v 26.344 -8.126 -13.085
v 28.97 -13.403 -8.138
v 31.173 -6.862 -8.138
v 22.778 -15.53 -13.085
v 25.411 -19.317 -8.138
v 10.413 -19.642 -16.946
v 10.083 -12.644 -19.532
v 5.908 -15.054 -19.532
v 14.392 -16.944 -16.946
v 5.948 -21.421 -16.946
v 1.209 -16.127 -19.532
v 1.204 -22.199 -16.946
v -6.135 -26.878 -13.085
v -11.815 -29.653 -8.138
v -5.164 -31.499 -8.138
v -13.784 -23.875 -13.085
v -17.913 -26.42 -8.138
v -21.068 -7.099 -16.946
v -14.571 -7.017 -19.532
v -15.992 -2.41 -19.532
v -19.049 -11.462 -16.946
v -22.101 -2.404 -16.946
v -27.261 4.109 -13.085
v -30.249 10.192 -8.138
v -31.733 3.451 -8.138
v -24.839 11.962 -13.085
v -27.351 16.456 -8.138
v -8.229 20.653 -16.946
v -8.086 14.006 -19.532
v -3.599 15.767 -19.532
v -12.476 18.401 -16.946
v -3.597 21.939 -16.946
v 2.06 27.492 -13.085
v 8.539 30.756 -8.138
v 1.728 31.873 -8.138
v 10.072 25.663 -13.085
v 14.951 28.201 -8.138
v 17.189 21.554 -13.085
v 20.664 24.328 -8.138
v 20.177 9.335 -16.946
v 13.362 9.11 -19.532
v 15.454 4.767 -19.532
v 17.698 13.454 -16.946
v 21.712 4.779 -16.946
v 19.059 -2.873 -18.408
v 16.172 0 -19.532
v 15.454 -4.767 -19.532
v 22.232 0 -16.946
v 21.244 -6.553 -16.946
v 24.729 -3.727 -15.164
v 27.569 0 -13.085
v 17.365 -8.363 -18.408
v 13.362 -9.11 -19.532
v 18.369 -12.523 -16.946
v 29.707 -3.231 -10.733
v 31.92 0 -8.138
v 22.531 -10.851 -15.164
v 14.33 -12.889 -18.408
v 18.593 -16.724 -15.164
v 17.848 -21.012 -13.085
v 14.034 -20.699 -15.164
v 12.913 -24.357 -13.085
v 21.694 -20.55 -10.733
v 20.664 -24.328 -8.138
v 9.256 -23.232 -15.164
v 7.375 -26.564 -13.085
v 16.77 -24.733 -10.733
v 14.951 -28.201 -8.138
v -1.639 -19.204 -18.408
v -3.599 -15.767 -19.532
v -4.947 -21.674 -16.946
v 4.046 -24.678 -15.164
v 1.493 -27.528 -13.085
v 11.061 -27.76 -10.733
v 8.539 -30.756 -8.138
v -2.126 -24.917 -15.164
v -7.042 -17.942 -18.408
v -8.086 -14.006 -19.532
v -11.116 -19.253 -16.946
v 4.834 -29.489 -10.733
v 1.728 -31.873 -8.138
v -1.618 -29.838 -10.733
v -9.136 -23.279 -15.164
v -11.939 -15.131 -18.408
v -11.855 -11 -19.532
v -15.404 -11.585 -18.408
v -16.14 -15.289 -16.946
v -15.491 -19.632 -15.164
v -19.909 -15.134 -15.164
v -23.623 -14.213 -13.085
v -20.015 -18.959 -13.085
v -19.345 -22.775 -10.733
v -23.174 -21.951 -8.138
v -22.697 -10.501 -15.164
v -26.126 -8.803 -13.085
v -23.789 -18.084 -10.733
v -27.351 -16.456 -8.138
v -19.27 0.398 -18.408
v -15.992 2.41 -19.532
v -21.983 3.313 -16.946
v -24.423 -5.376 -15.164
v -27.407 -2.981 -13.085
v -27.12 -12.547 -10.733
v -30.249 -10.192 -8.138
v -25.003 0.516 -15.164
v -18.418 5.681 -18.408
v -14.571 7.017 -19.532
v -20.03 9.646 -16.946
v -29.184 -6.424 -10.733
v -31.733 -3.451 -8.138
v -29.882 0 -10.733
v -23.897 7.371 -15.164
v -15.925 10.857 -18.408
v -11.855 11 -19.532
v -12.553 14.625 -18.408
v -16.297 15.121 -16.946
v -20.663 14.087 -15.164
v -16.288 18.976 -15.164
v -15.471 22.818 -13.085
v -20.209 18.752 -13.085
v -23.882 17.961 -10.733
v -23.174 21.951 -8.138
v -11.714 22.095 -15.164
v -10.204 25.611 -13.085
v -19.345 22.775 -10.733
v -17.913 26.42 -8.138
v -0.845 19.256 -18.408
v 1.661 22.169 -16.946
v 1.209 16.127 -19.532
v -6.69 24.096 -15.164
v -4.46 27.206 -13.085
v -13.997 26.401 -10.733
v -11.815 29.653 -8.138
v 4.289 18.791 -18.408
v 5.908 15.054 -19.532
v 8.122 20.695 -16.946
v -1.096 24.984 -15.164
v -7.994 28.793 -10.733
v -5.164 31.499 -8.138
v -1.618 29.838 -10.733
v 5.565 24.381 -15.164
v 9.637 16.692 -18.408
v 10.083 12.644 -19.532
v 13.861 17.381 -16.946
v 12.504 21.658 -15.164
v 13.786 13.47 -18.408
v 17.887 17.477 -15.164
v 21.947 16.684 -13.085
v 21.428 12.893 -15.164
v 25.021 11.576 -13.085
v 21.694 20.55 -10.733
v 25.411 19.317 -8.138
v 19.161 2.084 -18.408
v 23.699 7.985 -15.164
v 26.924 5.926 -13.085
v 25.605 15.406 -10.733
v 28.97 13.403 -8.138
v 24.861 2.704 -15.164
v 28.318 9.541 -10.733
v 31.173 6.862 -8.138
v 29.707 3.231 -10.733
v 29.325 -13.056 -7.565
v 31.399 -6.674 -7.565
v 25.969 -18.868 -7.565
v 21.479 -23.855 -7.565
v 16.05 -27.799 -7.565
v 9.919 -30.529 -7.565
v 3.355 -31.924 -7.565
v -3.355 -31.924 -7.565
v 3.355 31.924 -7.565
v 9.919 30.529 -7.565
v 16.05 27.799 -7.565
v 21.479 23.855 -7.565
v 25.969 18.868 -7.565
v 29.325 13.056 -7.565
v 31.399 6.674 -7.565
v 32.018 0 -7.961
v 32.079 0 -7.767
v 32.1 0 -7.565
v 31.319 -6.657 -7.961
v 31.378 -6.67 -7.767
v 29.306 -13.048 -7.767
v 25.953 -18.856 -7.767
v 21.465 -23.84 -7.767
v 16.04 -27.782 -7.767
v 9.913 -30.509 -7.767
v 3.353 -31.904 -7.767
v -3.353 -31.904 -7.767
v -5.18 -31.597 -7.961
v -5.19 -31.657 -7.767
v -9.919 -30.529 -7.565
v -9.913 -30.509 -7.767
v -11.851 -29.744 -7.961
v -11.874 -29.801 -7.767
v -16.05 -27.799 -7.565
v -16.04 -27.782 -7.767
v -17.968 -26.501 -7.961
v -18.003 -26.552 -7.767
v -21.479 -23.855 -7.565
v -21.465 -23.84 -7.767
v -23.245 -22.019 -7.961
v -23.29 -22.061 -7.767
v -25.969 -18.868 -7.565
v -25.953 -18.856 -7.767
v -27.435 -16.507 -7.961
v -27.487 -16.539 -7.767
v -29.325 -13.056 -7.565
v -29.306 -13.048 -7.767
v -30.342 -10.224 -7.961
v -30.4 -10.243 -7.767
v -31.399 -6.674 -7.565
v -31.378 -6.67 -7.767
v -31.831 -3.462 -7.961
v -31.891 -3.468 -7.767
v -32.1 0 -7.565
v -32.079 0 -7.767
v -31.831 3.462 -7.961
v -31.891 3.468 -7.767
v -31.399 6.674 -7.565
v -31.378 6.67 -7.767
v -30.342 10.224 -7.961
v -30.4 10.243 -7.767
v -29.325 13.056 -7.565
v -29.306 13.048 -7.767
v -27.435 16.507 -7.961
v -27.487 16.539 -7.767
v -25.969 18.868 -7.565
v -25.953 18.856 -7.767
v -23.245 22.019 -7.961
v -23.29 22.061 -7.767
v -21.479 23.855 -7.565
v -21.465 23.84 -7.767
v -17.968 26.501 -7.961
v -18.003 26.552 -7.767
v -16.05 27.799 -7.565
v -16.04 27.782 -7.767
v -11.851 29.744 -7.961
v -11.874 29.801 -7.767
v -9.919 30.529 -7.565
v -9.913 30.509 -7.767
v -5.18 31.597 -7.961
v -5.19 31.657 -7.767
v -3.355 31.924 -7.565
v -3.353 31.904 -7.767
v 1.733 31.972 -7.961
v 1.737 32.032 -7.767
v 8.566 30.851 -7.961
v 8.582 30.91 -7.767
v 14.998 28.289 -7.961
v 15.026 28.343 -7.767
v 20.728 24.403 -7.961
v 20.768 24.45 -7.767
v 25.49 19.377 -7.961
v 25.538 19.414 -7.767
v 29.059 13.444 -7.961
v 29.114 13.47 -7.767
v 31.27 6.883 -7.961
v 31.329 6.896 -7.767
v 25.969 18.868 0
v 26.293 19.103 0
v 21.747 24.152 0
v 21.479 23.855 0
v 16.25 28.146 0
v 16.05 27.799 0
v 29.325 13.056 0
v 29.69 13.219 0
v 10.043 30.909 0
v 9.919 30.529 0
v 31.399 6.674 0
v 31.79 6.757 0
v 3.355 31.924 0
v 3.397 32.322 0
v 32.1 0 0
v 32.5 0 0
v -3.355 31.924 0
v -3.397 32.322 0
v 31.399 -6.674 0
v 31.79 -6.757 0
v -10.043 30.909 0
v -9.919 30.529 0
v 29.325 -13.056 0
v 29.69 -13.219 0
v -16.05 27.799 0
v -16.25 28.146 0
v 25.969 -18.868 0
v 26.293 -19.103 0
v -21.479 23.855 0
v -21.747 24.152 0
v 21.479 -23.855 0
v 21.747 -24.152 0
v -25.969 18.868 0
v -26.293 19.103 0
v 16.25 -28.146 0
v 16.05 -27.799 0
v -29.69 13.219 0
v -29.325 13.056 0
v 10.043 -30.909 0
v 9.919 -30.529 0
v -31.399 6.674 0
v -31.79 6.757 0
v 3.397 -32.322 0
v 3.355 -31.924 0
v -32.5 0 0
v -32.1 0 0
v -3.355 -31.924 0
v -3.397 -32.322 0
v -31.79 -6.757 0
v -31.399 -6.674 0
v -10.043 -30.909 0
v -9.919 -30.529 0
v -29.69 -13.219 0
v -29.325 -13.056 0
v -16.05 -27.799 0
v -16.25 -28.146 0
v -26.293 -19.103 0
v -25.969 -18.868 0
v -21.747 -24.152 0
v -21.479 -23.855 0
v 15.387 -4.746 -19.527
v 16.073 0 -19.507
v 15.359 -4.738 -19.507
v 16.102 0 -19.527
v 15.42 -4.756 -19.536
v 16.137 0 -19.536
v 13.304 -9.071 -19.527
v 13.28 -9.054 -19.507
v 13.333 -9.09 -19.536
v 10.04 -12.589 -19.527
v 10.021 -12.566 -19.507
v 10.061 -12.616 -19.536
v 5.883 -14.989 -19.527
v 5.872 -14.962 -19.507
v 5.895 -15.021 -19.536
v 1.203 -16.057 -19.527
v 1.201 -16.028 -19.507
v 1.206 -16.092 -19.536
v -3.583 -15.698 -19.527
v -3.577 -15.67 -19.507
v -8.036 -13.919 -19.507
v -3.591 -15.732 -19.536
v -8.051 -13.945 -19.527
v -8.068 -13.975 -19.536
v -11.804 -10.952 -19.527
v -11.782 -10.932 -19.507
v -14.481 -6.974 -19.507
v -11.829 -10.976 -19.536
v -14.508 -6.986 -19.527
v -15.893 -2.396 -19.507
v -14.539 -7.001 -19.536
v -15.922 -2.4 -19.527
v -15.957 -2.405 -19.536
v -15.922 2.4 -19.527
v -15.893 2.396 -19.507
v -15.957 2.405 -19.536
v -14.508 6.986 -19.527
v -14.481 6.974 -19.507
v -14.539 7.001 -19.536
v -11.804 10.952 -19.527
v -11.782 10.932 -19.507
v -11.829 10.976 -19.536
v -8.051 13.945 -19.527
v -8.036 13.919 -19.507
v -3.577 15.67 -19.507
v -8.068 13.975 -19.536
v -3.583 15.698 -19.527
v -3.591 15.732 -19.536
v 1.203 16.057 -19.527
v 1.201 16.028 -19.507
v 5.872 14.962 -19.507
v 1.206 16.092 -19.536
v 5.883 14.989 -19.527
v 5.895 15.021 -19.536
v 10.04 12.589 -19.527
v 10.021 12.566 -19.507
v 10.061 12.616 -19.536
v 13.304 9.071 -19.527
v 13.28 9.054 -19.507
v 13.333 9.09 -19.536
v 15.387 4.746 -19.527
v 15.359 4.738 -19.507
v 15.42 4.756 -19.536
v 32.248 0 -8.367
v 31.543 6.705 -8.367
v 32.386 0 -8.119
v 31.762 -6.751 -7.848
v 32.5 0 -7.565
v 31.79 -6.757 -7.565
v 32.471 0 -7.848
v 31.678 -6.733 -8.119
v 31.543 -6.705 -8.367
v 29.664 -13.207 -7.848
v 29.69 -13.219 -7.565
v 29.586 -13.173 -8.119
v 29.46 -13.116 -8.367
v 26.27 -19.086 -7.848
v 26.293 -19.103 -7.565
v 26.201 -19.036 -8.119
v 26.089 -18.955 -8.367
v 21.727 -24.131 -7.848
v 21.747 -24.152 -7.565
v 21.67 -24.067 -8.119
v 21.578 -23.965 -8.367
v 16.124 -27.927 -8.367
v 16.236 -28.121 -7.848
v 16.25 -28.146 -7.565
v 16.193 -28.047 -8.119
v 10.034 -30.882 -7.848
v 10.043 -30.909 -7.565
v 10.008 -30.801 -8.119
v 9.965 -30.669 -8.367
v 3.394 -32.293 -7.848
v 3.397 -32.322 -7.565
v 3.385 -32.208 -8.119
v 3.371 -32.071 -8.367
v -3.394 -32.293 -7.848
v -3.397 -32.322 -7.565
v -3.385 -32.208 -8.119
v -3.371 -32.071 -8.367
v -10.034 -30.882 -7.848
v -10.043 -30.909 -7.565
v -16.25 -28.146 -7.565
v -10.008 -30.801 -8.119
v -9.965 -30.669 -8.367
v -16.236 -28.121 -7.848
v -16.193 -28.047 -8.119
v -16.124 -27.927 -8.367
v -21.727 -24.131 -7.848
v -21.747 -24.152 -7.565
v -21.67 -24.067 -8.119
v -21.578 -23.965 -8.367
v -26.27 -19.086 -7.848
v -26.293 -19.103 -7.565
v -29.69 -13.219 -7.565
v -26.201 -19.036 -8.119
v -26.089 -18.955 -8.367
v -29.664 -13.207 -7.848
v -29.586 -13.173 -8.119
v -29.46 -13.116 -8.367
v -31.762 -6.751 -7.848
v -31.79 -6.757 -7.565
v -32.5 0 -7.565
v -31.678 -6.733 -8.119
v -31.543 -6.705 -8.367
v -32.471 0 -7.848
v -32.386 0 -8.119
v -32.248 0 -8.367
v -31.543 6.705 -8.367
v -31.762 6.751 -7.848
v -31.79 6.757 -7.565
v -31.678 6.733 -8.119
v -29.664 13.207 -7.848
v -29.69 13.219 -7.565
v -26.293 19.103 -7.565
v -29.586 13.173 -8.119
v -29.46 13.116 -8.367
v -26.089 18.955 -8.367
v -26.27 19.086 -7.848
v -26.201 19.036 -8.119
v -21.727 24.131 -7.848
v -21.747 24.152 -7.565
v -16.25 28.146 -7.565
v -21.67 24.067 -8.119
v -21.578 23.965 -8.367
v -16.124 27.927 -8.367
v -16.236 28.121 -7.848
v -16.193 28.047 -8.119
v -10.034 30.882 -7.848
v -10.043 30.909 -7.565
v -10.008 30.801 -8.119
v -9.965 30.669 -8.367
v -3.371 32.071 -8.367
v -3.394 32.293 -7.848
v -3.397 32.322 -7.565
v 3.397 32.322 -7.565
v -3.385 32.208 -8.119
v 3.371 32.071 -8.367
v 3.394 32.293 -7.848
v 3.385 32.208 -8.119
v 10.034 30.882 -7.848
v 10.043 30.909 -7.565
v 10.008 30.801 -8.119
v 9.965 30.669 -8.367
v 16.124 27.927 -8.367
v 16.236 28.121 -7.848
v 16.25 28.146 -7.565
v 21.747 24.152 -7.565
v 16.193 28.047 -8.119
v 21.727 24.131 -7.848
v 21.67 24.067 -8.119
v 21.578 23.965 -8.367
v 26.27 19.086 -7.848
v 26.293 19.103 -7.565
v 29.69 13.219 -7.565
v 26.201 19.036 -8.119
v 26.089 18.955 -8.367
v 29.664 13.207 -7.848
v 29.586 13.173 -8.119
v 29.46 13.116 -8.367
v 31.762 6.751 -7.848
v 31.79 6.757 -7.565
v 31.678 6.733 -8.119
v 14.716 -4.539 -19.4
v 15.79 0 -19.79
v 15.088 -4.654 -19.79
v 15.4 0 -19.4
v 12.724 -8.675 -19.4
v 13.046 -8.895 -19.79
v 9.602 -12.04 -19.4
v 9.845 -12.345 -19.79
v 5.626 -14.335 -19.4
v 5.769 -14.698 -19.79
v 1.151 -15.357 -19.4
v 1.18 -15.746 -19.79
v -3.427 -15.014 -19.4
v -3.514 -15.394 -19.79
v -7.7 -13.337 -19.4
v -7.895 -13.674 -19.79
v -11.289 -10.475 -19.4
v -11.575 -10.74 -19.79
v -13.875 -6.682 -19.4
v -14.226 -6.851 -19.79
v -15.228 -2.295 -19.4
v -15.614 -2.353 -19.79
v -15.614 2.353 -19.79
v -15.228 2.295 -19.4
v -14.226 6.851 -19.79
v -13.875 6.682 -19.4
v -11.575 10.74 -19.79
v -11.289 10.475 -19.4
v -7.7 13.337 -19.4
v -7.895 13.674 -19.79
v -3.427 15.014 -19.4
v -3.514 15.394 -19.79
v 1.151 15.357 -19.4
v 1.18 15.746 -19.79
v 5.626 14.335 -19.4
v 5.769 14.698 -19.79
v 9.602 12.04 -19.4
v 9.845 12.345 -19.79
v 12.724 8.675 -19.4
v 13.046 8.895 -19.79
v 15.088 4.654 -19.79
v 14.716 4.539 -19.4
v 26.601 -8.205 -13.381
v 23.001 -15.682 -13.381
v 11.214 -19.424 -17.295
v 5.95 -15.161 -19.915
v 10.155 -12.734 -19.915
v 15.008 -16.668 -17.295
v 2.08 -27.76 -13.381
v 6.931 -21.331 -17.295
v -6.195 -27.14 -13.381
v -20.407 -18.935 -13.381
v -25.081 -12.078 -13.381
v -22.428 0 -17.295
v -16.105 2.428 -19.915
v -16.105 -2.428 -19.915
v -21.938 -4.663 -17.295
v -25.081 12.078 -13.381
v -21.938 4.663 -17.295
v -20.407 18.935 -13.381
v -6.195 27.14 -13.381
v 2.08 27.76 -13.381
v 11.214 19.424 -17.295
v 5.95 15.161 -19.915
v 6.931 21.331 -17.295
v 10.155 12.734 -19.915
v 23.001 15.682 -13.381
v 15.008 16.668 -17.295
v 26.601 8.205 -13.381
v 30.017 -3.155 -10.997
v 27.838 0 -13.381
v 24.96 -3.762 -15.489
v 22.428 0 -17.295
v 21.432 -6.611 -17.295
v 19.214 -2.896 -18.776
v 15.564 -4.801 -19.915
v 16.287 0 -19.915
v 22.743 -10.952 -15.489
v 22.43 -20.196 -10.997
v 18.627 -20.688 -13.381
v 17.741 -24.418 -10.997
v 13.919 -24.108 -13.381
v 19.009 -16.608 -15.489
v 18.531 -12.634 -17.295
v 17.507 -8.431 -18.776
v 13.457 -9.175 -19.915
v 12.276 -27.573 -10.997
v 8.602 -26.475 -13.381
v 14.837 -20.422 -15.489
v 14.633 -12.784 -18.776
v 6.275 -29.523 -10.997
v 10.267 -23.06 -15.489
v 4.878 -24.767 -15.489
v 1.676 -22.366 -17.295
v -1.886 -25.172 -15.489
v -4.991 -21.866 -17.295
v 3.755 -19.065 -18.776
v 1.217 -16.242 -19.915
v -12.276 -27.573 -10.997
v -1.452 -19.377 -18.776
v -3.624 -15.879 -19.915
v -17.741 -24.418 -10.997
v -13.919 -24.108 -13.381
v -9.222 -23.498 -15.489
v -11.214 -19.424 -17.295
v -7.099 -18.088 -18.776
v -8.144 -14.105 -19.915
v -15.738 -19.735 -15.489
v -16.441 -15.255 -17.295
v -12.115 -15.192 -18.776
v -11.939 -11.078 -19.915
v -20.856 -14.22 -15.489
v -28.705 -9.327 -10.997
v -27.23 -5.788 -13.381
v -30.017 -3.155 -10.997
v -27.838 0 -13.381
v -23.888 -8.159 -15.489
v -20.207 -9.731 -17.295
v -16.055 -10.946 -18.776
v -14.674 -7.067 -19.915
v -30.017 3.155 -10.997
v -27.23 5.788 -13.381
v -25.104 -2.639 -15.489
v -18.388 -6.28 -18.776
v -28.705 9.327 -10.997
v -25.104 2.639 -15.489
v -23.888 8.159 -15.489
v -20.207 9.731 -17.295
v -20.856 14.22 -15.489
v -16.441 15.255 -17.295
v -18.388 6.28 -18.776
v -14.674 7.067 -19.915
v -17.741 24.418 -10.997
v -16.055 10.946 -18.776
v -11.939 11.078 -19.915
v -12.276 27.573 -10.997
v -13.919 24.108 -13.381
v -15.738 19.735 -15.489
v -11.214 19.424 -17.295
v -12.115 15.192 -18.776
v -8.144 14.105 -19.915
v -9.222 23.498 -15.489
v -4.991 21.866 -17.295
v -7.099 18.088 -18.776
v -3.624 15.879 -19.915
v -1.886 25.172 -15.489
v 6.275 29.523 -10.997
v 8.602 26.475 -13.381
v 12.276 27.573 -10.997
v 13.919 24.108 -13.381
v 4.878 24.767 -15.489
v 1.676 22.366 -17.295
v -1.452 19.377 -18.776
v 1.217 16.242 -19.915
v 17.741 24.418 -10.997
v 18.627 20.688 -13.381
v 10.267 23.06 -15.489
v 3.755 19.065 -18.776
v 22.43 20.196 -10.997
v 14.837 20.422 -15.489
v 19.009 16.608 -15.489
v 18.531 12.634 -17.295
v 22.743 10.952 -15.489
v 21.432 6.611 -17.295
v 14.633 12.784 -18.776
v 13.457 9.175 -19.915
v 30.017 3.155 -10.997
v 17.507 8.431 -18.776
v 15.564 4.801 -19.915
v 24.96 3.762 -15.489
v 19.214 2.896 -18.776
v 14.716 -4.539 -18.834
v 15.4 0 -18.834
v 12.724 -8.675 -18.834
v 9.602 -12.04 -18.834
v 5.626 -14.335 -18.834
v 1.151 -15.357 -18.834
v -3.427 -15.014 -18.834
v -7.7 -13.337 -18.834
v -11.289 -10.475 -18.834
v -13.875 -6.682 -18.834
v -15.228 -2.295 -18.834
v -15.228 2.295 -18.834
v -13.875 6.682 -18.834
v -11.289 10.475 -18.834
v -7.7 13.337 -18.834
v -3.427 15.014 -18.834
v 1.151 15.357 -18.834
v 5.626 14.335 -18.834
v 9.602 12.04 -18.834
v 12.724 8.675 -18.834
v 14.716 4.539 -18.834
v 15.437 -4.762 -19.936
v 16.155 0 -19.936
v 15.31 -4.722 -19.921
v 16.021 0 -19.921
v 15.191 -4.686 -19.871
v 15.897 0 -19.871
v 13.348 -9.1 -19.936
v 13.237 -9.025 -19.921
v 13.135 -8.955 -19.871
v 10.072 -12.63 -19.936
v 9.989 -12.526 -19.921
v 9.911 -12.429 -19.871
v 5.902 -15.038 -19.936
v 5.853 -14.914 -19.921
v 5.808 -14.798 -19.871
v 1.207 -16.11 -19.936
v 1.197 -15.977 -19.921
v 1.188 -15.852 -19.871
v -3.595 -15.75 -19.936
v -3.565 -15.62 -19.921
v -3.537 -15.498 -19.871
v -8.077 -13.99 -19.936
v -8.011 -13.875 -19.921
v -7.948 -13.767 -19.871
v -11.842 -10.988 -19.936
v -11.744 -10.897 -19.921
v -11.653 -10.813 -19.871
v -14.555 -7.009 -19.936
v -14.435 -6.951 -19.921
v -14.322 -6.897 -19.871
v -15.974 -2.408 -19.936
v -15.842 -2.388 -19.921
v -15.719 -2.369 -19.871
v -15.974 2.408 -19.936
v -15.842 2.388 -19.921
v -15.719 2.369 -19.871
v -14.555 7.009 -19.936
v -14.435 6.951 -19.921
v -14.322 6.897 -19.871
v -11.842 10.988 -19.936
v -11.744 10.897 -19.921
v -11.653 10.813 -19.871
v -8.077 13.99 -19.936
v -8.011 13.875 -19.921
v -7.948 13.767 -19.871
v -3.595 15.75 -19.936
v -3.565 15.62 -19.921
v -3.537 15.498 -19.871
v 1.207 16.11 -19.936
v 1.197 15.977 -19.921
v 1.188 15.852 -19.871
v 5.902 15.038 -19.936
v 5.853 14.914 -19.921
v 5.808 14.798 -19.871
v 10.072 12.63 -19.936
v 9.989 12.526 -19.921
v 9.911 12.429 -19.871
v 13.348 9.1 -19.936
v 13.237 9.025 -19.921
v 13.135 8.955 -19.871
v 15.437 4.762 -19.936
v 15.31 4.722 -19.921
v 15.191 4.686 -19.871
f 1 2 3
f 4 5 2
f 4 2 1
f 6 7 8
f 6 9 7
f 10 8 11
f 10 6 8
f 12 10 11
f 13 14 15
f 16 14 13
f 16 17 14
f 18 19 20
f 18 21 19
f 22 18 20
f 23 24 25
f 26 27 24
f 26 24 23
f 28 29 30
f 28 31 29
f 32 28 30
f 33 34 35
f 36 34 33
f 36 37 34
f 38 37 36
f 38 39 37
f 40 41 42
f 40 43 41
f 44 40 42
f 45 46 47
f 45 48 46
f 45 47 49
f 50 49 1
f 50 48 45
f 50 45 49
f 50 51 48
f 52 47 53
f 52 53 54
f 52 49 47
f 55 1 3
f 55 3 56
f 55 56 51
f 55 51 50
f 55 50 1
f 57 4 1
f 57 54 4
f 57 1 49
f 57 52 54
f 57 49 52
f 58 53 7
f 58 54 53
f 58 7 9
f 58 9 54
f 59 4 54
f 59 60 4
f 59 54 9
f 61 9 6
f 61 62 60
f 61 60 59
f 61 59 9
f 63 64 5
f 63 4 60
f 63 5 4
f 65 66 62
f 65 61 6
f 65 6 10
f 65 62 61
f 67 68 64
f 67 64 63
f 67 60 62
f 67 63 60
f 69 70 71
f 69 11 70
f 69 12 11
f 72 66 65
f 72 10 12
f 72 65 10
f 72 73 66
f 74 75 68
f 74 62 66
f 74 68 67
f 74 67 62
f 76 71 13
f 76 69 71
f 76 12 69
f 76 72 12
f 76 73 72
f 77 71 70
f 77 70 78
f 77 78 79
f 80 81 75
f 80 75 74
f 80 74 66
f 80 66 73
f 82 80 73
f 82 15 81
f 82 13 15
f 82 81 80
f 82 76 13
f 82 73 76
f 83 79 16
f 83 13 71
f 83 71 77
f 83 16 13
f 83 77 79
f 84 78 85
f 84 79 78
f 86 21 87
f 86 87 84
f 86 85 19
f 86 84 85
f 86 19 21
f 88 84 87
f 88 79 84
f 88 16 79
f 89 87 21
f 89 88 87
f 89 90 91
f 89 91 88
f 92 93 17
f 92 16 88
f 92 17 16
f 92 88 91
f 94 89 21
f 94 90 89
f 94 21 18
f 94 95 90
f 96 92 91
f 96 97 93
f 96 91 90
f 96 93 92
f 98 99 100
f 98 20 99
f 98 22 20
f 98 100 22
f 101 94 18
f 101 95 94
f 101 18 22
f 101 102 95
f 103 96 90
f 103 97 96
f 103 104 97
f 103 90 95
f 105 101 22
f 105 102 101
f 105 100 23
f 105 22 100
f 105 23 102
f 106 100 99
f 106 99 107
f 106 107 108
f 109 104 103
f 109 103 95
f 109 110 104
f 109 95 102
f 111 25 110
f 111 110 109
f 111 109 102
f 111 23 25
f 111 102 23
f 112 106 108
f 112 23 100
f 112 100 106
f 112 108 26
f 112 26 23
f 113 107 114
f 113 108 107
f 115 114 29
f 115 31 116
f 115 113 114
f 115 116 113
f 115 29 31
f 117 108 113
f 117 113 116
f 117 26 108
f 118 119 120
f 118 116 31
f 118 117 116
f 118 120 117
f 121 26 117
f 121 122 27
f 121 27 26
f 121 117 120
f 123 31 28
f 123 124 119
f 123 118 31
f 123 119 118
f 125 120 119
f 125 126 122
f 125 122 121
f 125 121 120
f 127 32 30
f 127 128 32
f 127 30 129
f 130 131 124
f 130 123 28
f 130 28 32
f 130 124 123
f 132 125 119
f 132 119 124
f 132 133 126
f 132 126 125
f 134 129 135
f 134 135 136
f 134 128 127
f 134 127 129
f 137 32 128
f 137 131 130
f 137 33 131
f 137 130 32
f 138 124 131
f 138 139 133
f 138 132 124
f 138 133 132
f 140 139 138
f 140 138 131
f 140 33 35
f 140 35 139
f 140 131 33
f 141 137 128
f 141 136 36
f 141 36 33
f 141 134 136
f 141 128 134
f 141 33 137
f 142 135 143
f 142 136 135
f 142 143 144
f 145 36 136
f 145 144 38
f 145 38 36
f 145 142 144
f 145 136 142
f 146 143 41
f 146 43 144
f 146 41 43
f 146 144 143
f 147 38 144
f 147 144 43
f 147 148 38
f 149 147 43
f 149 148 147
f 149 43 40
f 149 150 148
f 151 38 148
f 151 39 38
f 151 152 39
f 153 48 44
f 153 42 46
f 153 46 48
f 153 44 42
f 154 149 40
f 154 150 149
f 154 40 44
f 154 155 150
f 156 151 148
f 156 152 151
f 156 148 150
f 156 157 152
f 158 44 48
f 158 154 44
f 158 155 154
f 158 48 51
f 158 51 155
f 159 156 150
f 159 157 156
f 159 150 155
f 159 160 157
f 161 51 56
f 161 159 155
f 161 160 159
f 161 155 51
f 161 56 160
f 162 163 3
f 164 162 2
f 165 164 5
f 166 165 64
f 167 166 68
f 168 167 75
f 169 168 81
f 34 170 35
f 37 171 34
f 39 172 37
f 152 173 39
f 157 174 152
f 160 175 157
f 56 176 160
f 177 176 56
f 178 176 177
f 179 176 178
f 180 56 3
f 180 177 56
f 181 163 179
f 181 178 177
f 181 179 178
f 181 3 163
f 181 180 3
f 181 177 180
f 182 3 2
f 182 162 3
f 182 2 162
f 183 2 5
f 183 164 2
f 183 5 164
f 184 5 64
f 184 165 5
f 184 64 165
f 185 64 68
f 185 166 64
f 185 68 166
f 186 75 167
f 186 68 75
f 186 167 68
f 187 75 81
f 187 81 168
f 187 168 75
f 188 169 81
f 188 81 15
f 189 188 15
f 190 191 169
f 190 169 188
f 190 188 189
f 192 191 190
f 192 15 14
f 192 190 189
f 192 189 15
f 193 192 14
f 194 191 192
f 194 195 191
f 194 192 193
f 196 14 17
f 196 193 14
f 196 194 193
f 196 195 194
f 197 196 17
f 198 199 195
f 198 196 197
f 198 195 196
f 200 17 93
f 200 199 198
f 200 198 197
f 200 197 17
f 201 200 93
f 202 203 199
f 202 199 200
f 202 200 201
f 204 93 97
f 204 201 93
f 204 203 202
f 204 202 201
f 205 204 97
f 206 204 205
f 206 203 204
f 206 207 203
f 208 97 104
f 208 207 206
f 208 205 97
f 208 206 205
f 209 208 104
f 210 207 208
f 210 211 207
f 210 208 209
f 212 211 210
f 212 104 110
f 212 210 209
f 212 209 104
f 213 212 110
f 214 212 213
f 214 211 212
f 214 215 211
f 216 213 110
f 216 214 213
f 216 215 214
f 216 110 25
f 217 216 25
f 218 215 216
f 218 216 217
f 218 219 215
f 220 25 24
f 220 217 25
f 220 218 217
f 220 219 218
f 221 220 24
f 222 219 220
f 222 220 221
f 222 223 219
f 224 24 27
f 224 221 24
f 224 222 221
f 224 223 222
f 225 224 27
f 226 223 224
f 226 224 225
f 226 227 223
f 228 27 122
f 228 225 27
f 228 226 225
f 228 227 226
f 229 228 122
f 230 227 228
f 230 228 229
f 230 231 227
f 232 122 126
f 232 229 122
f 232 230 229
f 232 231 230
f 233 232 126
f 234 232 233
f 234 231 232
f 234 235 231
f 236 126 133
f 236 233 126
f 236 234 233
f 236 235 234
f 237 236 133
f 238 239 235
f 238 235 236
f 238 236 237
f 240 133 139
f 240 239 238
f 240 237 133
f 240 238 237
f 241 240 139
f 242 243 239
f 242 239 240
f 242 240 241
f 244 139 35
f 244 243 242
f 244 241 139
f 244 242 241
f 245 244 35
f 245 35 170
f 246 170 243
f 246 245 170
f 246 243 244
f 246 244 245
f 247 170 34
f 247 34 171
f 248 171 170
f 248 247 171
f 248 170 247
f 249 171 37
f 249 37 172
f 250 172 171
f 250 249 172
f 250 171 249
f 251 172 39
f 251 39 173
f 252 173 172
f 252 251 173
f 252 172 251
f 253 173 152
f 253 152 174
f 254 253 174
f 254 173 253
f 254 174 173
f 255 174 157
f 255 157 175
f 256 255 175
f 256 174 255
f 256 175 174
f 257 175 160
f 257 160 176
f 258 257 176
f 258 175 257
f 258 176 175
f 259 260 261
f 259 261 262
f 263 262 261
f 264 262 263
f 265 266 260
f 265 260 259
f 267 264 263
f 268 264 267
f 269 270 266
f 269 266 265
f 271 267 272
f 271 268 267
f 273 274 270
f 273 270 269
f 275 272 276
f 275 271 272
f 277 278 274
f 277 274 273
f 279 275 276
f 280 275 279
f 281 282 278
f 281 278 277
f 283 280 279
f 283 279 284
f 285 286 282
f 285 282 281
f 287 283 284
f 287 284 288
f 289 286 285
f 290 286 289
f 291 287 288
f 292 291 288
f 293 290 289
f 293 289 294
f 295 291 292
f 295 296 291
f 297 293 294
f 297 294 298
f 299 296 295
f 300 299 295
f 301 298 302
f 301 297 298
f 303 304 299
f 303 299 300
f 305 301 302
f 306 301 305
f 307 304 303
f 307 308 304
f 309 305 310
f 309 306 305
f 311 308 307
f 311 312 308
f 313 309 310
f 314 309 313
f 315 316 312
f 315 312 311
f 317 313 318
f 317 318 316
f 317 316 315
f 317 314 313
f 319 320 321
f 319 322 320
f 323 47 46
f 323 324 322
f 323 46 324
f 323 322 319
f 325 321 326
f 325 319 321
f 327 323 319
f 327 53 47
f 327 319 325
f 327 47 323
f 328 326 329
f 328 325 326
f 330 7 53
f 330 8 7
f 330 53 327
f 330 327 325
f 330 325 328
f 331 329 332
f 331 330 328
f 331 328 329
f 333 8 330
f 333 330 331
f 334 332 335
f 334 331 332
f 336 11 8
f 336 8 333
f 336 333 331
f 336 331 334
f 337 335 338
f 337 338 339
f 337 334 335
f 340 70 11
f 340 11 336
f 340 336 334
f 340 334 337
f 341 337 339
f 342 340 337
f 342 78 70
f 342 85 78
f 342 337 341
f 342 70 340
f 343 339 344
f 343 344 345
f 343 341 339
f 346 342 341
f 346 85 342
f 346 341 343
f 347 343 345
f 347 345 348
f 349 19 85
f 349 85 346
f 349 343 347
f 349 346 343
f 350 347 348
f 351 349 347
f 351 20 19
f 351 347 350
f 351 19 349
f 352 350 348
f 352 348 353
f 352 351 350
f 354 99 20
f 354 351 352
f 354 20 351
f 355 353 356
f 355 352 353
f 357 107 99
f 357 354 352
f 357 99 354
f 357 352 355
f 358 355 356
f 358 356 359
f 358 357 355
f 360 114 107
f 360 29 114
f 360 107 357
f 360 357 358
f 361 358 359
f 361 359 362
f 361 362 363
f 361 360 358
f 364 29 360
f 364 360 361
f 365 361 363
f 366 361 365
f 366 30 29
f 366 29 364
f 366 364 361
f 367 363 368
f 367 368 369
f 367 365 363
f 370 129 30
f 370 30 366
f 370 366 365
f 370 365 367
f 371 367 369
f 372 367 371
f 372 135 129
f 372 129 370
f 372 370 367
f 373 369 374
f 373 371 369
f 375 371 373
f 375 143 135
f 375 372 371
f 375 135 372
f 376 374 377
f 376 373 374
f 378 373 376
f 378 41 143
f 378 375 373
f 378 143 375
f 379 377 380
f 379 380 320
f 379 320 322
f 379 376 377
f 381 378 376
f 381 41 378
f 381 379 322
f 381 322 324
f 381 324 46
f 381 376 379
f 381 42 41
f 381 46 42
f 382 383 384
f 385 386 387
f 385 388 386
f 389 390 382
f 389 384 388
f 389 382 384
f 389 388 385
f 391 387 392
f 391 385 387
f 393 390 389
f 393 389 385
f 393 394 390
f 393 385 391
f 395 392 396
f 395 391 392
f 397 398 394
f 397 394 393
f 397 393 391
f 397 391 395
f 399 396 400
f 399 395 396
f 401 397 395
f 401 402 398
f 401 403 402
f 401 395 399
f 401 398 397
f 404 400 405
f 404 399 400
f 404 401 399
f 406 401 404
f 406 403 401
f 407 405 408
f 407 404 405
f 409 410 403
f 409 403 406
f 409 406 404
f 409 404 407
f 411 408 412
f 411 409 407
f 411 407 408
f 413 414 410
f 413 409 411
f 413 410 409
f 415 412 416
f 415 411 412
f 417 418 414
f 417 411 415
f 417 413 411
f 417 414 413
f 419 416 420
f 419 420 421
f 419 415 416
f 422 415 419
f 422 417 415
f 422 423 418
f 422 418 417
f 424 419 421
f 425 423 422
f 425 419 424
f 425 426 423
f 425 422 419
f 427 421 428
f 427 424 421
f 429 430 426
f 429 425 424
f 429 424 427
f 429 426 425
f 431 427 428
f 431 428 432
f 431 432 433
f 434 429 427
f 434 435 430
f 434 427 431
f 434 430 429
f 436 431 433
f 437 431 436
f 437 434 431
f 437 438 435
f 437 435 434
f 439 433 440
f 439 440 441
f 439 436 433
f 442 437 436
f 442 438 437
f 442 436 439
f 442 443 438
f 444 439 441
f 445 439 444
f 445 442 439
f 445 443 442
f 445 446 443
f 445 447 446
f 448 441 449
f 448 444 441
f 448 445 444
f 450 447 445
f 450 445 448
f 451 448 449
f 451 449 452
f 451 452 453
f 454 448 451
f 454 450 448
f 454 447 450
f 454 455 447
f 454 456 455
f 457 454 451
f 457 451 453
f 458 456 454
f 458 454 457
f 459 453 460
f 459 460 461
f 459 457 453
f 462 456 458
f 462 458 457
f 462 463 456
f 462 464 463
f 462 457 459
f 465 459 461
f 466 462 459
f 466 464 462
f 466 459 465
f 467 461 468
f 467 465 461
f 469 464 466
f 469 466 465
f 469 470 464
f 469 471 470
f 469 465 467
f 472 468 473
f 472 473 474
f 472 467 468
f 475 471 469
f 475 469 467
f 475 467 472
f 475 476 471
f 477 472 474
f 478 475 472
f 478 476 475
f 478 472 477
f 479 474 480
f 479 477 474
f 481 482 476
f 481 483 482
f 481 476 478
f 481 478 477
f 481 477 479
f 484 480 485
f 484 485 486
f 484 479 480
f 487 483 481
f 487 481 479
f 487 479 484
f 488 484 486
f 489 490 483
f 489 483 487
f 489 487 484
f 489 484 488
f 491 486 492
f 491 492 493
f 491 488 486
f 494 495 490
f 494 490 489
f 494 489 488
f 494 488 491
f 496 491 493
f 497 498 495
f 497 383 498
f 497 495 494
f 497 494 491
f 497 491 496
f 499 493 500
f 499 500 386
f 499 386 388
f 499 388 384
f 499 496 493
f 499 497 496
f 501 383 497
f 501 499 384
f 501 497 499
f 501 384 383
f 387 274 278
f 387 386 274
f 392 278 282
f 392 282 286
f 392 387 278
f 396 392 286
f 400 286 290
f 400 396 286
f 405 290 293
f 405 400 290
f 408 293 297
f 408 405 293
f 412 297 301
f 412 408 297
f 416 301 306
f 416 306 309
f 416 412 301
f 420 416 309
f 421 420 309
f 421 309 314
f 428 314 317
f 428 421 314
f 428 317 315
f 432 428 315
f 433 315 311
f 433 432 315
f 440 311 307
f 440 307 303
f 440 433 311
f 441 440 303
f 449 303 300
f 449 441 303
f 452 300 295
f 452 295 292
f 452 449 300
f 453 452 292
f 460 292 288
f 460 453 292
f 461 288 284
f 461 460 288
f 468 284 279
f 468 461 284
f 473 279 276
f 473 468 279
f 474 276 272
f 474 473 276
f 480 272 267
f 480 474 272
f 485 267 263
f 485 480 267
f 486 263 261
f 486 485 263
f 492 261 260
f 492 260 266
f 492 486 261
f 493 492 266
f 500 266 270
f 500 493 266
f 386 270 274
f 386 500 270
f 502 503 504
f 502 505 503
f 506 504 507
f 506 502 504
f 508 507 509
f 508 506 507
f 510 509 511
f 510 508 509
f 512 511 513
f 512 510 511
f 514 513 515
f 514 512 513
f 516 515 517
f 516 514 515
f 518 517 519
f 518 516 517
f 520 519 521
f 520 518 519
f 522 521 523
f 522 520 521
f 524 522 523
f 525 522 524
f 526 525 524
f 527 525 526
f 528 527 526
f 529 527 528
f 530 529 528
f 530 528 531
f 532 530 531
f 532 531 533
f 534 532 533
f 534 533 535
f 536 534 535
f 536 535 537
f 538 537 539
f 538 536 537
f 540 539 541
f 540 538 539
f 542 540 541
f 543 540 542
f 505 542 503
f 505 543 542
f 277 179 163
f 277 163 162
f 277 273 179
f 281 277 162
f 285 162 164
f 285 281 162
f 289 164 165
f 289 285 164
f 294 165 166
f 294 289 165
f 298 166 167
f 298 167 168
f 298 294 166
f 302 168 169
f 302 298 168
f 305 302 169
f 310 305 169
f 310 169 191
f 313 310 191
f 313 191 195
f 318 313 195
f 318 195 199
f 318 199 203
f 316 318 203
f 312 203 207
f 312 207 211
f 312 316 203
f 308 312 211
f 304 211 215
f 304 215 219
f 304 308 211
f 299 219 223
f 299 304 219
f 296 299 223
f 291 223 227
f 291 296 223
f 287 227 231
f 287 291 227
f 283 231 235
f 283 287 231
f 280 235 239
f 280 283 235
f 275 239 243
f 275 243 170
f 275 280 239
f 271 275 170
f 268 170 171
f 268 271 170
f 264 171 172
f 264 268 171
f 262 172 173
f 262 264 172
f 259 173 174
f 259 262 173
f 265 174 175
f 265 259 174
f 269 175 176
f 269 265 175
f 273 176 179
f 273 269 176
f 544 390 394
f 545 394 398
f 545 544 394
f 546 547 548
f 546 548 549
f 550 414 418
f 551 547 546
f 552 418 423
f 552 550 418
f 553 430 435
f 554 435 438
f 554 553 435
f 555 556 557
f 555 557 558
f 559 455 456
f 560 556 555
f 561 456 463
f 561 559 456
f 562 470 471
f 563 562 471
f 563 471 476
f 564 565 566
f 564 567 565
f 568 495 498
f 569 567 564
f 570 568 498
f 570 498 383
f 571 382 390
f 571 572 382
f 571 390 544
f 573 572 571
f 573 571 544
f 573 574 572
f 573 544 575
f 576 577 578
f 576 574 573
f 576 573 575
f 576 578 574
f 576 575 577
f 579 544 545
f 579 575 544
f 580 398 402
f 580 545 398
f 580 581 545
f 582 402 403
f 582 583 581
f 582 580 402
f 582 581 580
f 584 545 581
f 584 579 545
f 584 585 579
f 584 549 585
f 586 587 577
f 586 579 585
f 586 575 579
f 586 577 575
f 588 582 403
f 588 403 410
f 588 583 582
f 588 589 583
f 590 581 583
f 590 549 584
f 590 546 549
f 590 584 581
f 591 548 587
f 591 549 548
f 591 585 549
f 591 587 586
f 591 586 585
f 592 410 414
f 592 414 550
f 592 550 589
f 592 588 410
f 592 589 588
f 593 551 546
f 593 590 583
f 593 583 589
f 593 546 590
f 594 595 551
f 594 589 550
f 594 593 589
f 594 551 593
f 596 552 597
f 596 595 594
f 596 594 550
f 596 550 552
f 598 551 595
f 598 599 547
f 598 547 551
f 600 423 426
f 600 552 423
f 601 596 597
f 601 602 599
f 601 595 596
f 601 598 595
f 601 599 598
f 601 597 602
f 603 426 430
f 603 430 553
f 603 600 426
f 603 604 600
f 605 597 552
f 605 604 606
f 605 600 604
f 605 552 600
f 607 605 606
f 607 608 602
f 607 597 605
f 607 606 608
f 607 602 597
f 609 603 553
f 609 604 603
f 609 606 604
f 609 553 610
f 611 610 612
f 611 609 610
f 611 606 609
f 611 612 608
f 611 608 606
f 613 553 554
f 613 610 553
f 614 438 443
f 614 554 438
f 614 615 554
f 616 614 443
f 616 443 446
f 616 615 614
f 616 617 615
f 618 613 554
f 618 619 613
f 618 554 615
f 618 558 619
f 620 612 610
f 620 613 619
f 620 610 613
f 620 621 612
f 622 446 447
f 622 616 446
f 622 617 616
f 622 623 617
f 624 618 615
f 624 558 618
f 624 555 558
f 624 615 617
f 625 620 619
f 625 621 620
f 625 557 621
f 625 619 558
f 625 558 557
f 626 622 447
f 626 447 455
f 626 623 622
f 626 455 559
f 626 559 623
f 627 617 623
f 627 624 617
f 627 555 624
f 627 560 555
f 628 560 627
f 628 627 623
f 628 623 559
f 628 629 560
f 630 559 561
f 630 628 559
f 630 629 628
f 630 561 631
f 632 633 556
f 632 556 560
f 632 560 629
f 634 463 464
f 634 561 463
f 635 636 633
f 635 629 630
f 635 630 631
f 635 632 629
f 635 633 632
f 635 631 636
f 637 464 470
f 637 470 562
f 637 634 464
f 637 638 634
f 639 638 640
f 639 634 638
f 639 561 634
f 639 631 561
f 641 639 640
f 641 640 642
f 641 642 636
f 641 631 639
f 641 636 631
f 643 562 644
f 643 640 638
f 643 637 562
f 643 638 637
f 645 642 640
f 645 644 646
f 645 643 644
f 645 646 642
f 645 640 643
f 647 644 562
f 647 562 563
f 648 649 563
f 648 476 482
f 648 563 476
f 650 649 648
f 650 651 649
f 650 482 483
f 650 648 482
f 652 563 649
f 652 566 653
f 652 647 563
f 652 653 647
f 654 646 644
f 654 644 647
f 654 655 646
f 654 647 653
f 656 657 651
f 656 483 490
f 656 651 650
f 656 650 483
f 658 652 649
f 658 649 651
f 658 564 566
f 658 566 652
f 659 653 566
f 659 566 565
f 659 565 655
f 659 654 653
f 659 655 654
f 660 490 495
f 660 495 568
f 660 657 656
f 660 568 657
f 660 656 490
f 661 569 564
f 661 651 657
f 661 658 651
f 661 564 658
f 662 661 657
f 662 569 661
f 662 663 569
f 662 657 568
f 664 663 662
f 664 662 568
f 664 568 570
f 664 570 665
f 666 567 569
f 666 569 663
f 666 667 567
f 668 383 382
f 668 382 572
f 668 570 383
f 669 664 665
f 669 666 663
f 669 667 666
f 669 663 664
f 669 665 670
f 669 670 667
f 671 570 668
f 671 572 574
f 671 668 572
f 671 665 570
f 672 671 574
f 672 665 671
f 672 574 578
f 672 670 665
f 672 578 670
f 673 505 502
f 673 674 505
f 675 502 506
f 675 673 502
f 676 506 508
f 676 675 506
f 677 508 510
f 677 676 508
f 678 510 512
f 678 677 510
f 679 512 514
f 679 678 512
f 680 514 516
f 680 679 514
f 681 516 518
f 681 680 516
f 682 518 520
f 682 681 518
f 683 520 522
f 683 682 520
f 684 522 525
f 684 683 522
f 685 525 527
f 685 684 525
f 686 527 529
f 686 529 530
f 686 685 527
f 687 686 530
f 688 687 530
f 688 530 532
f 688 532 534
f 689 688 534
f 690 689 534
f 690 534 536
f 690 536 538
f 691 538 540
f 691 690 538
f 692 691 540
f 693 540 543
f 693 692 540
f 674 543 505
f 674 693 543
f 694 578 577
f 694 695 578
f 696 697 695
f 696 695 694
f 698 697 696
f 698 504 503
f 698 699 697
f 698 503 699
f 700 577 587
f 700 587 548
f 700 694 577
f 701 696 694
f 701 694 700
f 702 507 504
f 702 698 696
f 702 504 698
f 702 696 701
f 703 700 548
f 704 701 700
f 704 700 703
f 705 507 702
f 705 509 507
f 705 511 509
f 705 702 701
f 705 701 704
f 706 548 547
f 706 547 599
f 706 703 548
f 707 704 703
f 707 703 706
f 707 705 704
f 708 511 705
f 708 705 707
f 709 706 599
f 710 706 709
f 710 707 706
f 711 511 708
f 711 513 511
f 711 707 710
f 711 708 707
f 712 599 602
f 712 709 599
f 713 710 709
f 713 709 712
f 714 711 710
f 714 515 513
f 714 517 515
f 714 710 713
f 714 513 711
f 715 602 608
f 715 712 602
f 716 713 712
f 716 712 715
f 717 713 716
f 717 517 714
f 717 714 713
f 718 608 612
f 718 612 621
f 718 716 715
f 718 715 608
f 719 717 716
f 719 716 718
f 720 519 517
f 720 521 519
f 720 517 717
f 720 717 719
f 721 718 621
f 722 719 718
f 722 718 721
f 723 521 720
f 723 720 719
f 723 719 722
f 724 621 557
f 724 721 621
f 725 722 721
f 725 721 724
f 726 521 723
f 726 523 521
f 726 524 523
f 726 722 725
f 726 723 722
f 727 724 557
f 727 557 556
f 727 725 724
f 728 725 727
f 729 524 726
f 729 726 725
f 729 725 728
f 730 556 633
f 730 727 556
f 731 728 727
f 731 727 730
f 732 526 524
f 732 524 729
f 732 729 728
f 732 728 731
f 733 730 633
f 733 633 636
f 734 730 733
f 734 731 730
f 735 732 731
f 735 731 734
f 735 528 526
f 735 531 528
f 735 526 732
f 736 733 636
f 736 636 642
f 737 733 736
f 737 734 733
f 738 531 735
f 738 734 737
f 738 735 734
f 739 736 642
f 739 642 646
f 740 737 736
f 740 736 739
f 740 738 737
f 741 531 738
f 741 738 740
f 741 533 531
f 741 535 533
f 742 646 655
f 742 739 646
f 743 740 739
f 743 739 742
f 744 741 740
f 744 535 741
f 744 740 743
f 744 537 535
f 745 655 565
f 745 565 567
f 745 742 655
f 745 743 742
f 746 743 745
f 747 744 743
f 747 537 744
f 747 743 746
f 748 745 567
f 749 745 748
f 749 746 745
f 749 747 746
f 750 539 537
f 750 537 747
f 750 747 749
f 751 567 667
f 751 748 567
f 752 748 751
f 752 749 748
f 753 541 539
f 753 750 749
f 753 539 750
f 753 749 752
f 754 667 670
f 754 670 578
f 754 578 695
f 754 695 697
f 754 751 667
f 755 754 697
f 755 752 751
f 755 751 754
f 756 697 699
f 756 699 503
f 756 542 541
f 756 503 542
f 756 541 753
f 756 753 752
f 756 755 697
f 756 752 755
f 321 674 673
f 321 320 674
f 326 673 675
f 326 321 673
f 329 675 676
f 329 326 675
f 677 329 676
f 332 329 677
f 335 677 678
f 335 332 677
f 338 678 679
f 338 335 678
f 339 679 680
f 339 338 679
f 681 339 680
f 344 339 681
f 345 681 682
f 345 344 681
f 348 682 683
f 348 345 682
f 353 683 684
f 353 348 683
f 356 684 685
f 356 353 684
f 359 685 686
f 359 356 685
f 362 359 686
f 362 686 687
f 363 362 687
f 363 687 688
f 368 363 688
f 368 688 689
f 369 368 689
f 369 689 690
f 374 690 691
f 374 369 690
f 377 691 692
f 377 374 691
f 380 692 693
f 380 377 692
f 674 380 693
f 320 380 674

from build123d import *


with BuildPart() as part:
    # Skica1 → Rotovat1 (revolve)
    with BuildSketch(Plane(origin=(0, 0, 0), x_dir=(1, 0, 0), z_dir=(0, 1, 0)), mode=Mode.PRIVATE) as rotovat1_sk:
        with BuildLine():
            Line((-32.5, 0), (-32.5, 7.565103942))
            ThreePointArc((-32.5, 7.565103942), (-32.435408582, 7.985441804), (-32.247594402, 8.36699364))
            ThreePointArc((-32.247594402, 8.36699364), (-25.24241357, 15.48854184), (-16.287341368, 19.915243672))
            ThreePointArc((-16.287341368, 19.915243672), (-16.02134619, 19.921234959), (-15.789937051, 19.789937051))
            Line((-15.789937051, 19.789937051), (-15.4, 19.4))
            Line((-15.4, 19.4), (-15.4, 18.834314575))
            Line((-15.4, 18.834314575), (-16.072779763, 19.507094338))
            ThreePointArc((-16.072779763, 19.507094338), (-16.119061591, 19.53335392), (-16.172260627, 19.532155663))
            ThreePointArc((-16.172260627, 19.532155663), (-25.007931866, 15.164476522), (-31.919710287, 8.137882298))
            ThreePointArc((-31.919710287, 8.137882298), (-32.053863273, 7.865345272), (-32.1, 7.565103942))
            Line((-32.1, 7.565103942), (-32.1, 0))
            Line((-32.1, 0), (-32.5, 0))
        make_face()
    revolve(rotovat1_sk.sketch.rotate(Axis((0, 0, 0), (0, 0, -1)), 180), axis=Axis((0, 0, 0), (0, 0, -1)))  # turned: the seam where the file's is


solid = part.part
